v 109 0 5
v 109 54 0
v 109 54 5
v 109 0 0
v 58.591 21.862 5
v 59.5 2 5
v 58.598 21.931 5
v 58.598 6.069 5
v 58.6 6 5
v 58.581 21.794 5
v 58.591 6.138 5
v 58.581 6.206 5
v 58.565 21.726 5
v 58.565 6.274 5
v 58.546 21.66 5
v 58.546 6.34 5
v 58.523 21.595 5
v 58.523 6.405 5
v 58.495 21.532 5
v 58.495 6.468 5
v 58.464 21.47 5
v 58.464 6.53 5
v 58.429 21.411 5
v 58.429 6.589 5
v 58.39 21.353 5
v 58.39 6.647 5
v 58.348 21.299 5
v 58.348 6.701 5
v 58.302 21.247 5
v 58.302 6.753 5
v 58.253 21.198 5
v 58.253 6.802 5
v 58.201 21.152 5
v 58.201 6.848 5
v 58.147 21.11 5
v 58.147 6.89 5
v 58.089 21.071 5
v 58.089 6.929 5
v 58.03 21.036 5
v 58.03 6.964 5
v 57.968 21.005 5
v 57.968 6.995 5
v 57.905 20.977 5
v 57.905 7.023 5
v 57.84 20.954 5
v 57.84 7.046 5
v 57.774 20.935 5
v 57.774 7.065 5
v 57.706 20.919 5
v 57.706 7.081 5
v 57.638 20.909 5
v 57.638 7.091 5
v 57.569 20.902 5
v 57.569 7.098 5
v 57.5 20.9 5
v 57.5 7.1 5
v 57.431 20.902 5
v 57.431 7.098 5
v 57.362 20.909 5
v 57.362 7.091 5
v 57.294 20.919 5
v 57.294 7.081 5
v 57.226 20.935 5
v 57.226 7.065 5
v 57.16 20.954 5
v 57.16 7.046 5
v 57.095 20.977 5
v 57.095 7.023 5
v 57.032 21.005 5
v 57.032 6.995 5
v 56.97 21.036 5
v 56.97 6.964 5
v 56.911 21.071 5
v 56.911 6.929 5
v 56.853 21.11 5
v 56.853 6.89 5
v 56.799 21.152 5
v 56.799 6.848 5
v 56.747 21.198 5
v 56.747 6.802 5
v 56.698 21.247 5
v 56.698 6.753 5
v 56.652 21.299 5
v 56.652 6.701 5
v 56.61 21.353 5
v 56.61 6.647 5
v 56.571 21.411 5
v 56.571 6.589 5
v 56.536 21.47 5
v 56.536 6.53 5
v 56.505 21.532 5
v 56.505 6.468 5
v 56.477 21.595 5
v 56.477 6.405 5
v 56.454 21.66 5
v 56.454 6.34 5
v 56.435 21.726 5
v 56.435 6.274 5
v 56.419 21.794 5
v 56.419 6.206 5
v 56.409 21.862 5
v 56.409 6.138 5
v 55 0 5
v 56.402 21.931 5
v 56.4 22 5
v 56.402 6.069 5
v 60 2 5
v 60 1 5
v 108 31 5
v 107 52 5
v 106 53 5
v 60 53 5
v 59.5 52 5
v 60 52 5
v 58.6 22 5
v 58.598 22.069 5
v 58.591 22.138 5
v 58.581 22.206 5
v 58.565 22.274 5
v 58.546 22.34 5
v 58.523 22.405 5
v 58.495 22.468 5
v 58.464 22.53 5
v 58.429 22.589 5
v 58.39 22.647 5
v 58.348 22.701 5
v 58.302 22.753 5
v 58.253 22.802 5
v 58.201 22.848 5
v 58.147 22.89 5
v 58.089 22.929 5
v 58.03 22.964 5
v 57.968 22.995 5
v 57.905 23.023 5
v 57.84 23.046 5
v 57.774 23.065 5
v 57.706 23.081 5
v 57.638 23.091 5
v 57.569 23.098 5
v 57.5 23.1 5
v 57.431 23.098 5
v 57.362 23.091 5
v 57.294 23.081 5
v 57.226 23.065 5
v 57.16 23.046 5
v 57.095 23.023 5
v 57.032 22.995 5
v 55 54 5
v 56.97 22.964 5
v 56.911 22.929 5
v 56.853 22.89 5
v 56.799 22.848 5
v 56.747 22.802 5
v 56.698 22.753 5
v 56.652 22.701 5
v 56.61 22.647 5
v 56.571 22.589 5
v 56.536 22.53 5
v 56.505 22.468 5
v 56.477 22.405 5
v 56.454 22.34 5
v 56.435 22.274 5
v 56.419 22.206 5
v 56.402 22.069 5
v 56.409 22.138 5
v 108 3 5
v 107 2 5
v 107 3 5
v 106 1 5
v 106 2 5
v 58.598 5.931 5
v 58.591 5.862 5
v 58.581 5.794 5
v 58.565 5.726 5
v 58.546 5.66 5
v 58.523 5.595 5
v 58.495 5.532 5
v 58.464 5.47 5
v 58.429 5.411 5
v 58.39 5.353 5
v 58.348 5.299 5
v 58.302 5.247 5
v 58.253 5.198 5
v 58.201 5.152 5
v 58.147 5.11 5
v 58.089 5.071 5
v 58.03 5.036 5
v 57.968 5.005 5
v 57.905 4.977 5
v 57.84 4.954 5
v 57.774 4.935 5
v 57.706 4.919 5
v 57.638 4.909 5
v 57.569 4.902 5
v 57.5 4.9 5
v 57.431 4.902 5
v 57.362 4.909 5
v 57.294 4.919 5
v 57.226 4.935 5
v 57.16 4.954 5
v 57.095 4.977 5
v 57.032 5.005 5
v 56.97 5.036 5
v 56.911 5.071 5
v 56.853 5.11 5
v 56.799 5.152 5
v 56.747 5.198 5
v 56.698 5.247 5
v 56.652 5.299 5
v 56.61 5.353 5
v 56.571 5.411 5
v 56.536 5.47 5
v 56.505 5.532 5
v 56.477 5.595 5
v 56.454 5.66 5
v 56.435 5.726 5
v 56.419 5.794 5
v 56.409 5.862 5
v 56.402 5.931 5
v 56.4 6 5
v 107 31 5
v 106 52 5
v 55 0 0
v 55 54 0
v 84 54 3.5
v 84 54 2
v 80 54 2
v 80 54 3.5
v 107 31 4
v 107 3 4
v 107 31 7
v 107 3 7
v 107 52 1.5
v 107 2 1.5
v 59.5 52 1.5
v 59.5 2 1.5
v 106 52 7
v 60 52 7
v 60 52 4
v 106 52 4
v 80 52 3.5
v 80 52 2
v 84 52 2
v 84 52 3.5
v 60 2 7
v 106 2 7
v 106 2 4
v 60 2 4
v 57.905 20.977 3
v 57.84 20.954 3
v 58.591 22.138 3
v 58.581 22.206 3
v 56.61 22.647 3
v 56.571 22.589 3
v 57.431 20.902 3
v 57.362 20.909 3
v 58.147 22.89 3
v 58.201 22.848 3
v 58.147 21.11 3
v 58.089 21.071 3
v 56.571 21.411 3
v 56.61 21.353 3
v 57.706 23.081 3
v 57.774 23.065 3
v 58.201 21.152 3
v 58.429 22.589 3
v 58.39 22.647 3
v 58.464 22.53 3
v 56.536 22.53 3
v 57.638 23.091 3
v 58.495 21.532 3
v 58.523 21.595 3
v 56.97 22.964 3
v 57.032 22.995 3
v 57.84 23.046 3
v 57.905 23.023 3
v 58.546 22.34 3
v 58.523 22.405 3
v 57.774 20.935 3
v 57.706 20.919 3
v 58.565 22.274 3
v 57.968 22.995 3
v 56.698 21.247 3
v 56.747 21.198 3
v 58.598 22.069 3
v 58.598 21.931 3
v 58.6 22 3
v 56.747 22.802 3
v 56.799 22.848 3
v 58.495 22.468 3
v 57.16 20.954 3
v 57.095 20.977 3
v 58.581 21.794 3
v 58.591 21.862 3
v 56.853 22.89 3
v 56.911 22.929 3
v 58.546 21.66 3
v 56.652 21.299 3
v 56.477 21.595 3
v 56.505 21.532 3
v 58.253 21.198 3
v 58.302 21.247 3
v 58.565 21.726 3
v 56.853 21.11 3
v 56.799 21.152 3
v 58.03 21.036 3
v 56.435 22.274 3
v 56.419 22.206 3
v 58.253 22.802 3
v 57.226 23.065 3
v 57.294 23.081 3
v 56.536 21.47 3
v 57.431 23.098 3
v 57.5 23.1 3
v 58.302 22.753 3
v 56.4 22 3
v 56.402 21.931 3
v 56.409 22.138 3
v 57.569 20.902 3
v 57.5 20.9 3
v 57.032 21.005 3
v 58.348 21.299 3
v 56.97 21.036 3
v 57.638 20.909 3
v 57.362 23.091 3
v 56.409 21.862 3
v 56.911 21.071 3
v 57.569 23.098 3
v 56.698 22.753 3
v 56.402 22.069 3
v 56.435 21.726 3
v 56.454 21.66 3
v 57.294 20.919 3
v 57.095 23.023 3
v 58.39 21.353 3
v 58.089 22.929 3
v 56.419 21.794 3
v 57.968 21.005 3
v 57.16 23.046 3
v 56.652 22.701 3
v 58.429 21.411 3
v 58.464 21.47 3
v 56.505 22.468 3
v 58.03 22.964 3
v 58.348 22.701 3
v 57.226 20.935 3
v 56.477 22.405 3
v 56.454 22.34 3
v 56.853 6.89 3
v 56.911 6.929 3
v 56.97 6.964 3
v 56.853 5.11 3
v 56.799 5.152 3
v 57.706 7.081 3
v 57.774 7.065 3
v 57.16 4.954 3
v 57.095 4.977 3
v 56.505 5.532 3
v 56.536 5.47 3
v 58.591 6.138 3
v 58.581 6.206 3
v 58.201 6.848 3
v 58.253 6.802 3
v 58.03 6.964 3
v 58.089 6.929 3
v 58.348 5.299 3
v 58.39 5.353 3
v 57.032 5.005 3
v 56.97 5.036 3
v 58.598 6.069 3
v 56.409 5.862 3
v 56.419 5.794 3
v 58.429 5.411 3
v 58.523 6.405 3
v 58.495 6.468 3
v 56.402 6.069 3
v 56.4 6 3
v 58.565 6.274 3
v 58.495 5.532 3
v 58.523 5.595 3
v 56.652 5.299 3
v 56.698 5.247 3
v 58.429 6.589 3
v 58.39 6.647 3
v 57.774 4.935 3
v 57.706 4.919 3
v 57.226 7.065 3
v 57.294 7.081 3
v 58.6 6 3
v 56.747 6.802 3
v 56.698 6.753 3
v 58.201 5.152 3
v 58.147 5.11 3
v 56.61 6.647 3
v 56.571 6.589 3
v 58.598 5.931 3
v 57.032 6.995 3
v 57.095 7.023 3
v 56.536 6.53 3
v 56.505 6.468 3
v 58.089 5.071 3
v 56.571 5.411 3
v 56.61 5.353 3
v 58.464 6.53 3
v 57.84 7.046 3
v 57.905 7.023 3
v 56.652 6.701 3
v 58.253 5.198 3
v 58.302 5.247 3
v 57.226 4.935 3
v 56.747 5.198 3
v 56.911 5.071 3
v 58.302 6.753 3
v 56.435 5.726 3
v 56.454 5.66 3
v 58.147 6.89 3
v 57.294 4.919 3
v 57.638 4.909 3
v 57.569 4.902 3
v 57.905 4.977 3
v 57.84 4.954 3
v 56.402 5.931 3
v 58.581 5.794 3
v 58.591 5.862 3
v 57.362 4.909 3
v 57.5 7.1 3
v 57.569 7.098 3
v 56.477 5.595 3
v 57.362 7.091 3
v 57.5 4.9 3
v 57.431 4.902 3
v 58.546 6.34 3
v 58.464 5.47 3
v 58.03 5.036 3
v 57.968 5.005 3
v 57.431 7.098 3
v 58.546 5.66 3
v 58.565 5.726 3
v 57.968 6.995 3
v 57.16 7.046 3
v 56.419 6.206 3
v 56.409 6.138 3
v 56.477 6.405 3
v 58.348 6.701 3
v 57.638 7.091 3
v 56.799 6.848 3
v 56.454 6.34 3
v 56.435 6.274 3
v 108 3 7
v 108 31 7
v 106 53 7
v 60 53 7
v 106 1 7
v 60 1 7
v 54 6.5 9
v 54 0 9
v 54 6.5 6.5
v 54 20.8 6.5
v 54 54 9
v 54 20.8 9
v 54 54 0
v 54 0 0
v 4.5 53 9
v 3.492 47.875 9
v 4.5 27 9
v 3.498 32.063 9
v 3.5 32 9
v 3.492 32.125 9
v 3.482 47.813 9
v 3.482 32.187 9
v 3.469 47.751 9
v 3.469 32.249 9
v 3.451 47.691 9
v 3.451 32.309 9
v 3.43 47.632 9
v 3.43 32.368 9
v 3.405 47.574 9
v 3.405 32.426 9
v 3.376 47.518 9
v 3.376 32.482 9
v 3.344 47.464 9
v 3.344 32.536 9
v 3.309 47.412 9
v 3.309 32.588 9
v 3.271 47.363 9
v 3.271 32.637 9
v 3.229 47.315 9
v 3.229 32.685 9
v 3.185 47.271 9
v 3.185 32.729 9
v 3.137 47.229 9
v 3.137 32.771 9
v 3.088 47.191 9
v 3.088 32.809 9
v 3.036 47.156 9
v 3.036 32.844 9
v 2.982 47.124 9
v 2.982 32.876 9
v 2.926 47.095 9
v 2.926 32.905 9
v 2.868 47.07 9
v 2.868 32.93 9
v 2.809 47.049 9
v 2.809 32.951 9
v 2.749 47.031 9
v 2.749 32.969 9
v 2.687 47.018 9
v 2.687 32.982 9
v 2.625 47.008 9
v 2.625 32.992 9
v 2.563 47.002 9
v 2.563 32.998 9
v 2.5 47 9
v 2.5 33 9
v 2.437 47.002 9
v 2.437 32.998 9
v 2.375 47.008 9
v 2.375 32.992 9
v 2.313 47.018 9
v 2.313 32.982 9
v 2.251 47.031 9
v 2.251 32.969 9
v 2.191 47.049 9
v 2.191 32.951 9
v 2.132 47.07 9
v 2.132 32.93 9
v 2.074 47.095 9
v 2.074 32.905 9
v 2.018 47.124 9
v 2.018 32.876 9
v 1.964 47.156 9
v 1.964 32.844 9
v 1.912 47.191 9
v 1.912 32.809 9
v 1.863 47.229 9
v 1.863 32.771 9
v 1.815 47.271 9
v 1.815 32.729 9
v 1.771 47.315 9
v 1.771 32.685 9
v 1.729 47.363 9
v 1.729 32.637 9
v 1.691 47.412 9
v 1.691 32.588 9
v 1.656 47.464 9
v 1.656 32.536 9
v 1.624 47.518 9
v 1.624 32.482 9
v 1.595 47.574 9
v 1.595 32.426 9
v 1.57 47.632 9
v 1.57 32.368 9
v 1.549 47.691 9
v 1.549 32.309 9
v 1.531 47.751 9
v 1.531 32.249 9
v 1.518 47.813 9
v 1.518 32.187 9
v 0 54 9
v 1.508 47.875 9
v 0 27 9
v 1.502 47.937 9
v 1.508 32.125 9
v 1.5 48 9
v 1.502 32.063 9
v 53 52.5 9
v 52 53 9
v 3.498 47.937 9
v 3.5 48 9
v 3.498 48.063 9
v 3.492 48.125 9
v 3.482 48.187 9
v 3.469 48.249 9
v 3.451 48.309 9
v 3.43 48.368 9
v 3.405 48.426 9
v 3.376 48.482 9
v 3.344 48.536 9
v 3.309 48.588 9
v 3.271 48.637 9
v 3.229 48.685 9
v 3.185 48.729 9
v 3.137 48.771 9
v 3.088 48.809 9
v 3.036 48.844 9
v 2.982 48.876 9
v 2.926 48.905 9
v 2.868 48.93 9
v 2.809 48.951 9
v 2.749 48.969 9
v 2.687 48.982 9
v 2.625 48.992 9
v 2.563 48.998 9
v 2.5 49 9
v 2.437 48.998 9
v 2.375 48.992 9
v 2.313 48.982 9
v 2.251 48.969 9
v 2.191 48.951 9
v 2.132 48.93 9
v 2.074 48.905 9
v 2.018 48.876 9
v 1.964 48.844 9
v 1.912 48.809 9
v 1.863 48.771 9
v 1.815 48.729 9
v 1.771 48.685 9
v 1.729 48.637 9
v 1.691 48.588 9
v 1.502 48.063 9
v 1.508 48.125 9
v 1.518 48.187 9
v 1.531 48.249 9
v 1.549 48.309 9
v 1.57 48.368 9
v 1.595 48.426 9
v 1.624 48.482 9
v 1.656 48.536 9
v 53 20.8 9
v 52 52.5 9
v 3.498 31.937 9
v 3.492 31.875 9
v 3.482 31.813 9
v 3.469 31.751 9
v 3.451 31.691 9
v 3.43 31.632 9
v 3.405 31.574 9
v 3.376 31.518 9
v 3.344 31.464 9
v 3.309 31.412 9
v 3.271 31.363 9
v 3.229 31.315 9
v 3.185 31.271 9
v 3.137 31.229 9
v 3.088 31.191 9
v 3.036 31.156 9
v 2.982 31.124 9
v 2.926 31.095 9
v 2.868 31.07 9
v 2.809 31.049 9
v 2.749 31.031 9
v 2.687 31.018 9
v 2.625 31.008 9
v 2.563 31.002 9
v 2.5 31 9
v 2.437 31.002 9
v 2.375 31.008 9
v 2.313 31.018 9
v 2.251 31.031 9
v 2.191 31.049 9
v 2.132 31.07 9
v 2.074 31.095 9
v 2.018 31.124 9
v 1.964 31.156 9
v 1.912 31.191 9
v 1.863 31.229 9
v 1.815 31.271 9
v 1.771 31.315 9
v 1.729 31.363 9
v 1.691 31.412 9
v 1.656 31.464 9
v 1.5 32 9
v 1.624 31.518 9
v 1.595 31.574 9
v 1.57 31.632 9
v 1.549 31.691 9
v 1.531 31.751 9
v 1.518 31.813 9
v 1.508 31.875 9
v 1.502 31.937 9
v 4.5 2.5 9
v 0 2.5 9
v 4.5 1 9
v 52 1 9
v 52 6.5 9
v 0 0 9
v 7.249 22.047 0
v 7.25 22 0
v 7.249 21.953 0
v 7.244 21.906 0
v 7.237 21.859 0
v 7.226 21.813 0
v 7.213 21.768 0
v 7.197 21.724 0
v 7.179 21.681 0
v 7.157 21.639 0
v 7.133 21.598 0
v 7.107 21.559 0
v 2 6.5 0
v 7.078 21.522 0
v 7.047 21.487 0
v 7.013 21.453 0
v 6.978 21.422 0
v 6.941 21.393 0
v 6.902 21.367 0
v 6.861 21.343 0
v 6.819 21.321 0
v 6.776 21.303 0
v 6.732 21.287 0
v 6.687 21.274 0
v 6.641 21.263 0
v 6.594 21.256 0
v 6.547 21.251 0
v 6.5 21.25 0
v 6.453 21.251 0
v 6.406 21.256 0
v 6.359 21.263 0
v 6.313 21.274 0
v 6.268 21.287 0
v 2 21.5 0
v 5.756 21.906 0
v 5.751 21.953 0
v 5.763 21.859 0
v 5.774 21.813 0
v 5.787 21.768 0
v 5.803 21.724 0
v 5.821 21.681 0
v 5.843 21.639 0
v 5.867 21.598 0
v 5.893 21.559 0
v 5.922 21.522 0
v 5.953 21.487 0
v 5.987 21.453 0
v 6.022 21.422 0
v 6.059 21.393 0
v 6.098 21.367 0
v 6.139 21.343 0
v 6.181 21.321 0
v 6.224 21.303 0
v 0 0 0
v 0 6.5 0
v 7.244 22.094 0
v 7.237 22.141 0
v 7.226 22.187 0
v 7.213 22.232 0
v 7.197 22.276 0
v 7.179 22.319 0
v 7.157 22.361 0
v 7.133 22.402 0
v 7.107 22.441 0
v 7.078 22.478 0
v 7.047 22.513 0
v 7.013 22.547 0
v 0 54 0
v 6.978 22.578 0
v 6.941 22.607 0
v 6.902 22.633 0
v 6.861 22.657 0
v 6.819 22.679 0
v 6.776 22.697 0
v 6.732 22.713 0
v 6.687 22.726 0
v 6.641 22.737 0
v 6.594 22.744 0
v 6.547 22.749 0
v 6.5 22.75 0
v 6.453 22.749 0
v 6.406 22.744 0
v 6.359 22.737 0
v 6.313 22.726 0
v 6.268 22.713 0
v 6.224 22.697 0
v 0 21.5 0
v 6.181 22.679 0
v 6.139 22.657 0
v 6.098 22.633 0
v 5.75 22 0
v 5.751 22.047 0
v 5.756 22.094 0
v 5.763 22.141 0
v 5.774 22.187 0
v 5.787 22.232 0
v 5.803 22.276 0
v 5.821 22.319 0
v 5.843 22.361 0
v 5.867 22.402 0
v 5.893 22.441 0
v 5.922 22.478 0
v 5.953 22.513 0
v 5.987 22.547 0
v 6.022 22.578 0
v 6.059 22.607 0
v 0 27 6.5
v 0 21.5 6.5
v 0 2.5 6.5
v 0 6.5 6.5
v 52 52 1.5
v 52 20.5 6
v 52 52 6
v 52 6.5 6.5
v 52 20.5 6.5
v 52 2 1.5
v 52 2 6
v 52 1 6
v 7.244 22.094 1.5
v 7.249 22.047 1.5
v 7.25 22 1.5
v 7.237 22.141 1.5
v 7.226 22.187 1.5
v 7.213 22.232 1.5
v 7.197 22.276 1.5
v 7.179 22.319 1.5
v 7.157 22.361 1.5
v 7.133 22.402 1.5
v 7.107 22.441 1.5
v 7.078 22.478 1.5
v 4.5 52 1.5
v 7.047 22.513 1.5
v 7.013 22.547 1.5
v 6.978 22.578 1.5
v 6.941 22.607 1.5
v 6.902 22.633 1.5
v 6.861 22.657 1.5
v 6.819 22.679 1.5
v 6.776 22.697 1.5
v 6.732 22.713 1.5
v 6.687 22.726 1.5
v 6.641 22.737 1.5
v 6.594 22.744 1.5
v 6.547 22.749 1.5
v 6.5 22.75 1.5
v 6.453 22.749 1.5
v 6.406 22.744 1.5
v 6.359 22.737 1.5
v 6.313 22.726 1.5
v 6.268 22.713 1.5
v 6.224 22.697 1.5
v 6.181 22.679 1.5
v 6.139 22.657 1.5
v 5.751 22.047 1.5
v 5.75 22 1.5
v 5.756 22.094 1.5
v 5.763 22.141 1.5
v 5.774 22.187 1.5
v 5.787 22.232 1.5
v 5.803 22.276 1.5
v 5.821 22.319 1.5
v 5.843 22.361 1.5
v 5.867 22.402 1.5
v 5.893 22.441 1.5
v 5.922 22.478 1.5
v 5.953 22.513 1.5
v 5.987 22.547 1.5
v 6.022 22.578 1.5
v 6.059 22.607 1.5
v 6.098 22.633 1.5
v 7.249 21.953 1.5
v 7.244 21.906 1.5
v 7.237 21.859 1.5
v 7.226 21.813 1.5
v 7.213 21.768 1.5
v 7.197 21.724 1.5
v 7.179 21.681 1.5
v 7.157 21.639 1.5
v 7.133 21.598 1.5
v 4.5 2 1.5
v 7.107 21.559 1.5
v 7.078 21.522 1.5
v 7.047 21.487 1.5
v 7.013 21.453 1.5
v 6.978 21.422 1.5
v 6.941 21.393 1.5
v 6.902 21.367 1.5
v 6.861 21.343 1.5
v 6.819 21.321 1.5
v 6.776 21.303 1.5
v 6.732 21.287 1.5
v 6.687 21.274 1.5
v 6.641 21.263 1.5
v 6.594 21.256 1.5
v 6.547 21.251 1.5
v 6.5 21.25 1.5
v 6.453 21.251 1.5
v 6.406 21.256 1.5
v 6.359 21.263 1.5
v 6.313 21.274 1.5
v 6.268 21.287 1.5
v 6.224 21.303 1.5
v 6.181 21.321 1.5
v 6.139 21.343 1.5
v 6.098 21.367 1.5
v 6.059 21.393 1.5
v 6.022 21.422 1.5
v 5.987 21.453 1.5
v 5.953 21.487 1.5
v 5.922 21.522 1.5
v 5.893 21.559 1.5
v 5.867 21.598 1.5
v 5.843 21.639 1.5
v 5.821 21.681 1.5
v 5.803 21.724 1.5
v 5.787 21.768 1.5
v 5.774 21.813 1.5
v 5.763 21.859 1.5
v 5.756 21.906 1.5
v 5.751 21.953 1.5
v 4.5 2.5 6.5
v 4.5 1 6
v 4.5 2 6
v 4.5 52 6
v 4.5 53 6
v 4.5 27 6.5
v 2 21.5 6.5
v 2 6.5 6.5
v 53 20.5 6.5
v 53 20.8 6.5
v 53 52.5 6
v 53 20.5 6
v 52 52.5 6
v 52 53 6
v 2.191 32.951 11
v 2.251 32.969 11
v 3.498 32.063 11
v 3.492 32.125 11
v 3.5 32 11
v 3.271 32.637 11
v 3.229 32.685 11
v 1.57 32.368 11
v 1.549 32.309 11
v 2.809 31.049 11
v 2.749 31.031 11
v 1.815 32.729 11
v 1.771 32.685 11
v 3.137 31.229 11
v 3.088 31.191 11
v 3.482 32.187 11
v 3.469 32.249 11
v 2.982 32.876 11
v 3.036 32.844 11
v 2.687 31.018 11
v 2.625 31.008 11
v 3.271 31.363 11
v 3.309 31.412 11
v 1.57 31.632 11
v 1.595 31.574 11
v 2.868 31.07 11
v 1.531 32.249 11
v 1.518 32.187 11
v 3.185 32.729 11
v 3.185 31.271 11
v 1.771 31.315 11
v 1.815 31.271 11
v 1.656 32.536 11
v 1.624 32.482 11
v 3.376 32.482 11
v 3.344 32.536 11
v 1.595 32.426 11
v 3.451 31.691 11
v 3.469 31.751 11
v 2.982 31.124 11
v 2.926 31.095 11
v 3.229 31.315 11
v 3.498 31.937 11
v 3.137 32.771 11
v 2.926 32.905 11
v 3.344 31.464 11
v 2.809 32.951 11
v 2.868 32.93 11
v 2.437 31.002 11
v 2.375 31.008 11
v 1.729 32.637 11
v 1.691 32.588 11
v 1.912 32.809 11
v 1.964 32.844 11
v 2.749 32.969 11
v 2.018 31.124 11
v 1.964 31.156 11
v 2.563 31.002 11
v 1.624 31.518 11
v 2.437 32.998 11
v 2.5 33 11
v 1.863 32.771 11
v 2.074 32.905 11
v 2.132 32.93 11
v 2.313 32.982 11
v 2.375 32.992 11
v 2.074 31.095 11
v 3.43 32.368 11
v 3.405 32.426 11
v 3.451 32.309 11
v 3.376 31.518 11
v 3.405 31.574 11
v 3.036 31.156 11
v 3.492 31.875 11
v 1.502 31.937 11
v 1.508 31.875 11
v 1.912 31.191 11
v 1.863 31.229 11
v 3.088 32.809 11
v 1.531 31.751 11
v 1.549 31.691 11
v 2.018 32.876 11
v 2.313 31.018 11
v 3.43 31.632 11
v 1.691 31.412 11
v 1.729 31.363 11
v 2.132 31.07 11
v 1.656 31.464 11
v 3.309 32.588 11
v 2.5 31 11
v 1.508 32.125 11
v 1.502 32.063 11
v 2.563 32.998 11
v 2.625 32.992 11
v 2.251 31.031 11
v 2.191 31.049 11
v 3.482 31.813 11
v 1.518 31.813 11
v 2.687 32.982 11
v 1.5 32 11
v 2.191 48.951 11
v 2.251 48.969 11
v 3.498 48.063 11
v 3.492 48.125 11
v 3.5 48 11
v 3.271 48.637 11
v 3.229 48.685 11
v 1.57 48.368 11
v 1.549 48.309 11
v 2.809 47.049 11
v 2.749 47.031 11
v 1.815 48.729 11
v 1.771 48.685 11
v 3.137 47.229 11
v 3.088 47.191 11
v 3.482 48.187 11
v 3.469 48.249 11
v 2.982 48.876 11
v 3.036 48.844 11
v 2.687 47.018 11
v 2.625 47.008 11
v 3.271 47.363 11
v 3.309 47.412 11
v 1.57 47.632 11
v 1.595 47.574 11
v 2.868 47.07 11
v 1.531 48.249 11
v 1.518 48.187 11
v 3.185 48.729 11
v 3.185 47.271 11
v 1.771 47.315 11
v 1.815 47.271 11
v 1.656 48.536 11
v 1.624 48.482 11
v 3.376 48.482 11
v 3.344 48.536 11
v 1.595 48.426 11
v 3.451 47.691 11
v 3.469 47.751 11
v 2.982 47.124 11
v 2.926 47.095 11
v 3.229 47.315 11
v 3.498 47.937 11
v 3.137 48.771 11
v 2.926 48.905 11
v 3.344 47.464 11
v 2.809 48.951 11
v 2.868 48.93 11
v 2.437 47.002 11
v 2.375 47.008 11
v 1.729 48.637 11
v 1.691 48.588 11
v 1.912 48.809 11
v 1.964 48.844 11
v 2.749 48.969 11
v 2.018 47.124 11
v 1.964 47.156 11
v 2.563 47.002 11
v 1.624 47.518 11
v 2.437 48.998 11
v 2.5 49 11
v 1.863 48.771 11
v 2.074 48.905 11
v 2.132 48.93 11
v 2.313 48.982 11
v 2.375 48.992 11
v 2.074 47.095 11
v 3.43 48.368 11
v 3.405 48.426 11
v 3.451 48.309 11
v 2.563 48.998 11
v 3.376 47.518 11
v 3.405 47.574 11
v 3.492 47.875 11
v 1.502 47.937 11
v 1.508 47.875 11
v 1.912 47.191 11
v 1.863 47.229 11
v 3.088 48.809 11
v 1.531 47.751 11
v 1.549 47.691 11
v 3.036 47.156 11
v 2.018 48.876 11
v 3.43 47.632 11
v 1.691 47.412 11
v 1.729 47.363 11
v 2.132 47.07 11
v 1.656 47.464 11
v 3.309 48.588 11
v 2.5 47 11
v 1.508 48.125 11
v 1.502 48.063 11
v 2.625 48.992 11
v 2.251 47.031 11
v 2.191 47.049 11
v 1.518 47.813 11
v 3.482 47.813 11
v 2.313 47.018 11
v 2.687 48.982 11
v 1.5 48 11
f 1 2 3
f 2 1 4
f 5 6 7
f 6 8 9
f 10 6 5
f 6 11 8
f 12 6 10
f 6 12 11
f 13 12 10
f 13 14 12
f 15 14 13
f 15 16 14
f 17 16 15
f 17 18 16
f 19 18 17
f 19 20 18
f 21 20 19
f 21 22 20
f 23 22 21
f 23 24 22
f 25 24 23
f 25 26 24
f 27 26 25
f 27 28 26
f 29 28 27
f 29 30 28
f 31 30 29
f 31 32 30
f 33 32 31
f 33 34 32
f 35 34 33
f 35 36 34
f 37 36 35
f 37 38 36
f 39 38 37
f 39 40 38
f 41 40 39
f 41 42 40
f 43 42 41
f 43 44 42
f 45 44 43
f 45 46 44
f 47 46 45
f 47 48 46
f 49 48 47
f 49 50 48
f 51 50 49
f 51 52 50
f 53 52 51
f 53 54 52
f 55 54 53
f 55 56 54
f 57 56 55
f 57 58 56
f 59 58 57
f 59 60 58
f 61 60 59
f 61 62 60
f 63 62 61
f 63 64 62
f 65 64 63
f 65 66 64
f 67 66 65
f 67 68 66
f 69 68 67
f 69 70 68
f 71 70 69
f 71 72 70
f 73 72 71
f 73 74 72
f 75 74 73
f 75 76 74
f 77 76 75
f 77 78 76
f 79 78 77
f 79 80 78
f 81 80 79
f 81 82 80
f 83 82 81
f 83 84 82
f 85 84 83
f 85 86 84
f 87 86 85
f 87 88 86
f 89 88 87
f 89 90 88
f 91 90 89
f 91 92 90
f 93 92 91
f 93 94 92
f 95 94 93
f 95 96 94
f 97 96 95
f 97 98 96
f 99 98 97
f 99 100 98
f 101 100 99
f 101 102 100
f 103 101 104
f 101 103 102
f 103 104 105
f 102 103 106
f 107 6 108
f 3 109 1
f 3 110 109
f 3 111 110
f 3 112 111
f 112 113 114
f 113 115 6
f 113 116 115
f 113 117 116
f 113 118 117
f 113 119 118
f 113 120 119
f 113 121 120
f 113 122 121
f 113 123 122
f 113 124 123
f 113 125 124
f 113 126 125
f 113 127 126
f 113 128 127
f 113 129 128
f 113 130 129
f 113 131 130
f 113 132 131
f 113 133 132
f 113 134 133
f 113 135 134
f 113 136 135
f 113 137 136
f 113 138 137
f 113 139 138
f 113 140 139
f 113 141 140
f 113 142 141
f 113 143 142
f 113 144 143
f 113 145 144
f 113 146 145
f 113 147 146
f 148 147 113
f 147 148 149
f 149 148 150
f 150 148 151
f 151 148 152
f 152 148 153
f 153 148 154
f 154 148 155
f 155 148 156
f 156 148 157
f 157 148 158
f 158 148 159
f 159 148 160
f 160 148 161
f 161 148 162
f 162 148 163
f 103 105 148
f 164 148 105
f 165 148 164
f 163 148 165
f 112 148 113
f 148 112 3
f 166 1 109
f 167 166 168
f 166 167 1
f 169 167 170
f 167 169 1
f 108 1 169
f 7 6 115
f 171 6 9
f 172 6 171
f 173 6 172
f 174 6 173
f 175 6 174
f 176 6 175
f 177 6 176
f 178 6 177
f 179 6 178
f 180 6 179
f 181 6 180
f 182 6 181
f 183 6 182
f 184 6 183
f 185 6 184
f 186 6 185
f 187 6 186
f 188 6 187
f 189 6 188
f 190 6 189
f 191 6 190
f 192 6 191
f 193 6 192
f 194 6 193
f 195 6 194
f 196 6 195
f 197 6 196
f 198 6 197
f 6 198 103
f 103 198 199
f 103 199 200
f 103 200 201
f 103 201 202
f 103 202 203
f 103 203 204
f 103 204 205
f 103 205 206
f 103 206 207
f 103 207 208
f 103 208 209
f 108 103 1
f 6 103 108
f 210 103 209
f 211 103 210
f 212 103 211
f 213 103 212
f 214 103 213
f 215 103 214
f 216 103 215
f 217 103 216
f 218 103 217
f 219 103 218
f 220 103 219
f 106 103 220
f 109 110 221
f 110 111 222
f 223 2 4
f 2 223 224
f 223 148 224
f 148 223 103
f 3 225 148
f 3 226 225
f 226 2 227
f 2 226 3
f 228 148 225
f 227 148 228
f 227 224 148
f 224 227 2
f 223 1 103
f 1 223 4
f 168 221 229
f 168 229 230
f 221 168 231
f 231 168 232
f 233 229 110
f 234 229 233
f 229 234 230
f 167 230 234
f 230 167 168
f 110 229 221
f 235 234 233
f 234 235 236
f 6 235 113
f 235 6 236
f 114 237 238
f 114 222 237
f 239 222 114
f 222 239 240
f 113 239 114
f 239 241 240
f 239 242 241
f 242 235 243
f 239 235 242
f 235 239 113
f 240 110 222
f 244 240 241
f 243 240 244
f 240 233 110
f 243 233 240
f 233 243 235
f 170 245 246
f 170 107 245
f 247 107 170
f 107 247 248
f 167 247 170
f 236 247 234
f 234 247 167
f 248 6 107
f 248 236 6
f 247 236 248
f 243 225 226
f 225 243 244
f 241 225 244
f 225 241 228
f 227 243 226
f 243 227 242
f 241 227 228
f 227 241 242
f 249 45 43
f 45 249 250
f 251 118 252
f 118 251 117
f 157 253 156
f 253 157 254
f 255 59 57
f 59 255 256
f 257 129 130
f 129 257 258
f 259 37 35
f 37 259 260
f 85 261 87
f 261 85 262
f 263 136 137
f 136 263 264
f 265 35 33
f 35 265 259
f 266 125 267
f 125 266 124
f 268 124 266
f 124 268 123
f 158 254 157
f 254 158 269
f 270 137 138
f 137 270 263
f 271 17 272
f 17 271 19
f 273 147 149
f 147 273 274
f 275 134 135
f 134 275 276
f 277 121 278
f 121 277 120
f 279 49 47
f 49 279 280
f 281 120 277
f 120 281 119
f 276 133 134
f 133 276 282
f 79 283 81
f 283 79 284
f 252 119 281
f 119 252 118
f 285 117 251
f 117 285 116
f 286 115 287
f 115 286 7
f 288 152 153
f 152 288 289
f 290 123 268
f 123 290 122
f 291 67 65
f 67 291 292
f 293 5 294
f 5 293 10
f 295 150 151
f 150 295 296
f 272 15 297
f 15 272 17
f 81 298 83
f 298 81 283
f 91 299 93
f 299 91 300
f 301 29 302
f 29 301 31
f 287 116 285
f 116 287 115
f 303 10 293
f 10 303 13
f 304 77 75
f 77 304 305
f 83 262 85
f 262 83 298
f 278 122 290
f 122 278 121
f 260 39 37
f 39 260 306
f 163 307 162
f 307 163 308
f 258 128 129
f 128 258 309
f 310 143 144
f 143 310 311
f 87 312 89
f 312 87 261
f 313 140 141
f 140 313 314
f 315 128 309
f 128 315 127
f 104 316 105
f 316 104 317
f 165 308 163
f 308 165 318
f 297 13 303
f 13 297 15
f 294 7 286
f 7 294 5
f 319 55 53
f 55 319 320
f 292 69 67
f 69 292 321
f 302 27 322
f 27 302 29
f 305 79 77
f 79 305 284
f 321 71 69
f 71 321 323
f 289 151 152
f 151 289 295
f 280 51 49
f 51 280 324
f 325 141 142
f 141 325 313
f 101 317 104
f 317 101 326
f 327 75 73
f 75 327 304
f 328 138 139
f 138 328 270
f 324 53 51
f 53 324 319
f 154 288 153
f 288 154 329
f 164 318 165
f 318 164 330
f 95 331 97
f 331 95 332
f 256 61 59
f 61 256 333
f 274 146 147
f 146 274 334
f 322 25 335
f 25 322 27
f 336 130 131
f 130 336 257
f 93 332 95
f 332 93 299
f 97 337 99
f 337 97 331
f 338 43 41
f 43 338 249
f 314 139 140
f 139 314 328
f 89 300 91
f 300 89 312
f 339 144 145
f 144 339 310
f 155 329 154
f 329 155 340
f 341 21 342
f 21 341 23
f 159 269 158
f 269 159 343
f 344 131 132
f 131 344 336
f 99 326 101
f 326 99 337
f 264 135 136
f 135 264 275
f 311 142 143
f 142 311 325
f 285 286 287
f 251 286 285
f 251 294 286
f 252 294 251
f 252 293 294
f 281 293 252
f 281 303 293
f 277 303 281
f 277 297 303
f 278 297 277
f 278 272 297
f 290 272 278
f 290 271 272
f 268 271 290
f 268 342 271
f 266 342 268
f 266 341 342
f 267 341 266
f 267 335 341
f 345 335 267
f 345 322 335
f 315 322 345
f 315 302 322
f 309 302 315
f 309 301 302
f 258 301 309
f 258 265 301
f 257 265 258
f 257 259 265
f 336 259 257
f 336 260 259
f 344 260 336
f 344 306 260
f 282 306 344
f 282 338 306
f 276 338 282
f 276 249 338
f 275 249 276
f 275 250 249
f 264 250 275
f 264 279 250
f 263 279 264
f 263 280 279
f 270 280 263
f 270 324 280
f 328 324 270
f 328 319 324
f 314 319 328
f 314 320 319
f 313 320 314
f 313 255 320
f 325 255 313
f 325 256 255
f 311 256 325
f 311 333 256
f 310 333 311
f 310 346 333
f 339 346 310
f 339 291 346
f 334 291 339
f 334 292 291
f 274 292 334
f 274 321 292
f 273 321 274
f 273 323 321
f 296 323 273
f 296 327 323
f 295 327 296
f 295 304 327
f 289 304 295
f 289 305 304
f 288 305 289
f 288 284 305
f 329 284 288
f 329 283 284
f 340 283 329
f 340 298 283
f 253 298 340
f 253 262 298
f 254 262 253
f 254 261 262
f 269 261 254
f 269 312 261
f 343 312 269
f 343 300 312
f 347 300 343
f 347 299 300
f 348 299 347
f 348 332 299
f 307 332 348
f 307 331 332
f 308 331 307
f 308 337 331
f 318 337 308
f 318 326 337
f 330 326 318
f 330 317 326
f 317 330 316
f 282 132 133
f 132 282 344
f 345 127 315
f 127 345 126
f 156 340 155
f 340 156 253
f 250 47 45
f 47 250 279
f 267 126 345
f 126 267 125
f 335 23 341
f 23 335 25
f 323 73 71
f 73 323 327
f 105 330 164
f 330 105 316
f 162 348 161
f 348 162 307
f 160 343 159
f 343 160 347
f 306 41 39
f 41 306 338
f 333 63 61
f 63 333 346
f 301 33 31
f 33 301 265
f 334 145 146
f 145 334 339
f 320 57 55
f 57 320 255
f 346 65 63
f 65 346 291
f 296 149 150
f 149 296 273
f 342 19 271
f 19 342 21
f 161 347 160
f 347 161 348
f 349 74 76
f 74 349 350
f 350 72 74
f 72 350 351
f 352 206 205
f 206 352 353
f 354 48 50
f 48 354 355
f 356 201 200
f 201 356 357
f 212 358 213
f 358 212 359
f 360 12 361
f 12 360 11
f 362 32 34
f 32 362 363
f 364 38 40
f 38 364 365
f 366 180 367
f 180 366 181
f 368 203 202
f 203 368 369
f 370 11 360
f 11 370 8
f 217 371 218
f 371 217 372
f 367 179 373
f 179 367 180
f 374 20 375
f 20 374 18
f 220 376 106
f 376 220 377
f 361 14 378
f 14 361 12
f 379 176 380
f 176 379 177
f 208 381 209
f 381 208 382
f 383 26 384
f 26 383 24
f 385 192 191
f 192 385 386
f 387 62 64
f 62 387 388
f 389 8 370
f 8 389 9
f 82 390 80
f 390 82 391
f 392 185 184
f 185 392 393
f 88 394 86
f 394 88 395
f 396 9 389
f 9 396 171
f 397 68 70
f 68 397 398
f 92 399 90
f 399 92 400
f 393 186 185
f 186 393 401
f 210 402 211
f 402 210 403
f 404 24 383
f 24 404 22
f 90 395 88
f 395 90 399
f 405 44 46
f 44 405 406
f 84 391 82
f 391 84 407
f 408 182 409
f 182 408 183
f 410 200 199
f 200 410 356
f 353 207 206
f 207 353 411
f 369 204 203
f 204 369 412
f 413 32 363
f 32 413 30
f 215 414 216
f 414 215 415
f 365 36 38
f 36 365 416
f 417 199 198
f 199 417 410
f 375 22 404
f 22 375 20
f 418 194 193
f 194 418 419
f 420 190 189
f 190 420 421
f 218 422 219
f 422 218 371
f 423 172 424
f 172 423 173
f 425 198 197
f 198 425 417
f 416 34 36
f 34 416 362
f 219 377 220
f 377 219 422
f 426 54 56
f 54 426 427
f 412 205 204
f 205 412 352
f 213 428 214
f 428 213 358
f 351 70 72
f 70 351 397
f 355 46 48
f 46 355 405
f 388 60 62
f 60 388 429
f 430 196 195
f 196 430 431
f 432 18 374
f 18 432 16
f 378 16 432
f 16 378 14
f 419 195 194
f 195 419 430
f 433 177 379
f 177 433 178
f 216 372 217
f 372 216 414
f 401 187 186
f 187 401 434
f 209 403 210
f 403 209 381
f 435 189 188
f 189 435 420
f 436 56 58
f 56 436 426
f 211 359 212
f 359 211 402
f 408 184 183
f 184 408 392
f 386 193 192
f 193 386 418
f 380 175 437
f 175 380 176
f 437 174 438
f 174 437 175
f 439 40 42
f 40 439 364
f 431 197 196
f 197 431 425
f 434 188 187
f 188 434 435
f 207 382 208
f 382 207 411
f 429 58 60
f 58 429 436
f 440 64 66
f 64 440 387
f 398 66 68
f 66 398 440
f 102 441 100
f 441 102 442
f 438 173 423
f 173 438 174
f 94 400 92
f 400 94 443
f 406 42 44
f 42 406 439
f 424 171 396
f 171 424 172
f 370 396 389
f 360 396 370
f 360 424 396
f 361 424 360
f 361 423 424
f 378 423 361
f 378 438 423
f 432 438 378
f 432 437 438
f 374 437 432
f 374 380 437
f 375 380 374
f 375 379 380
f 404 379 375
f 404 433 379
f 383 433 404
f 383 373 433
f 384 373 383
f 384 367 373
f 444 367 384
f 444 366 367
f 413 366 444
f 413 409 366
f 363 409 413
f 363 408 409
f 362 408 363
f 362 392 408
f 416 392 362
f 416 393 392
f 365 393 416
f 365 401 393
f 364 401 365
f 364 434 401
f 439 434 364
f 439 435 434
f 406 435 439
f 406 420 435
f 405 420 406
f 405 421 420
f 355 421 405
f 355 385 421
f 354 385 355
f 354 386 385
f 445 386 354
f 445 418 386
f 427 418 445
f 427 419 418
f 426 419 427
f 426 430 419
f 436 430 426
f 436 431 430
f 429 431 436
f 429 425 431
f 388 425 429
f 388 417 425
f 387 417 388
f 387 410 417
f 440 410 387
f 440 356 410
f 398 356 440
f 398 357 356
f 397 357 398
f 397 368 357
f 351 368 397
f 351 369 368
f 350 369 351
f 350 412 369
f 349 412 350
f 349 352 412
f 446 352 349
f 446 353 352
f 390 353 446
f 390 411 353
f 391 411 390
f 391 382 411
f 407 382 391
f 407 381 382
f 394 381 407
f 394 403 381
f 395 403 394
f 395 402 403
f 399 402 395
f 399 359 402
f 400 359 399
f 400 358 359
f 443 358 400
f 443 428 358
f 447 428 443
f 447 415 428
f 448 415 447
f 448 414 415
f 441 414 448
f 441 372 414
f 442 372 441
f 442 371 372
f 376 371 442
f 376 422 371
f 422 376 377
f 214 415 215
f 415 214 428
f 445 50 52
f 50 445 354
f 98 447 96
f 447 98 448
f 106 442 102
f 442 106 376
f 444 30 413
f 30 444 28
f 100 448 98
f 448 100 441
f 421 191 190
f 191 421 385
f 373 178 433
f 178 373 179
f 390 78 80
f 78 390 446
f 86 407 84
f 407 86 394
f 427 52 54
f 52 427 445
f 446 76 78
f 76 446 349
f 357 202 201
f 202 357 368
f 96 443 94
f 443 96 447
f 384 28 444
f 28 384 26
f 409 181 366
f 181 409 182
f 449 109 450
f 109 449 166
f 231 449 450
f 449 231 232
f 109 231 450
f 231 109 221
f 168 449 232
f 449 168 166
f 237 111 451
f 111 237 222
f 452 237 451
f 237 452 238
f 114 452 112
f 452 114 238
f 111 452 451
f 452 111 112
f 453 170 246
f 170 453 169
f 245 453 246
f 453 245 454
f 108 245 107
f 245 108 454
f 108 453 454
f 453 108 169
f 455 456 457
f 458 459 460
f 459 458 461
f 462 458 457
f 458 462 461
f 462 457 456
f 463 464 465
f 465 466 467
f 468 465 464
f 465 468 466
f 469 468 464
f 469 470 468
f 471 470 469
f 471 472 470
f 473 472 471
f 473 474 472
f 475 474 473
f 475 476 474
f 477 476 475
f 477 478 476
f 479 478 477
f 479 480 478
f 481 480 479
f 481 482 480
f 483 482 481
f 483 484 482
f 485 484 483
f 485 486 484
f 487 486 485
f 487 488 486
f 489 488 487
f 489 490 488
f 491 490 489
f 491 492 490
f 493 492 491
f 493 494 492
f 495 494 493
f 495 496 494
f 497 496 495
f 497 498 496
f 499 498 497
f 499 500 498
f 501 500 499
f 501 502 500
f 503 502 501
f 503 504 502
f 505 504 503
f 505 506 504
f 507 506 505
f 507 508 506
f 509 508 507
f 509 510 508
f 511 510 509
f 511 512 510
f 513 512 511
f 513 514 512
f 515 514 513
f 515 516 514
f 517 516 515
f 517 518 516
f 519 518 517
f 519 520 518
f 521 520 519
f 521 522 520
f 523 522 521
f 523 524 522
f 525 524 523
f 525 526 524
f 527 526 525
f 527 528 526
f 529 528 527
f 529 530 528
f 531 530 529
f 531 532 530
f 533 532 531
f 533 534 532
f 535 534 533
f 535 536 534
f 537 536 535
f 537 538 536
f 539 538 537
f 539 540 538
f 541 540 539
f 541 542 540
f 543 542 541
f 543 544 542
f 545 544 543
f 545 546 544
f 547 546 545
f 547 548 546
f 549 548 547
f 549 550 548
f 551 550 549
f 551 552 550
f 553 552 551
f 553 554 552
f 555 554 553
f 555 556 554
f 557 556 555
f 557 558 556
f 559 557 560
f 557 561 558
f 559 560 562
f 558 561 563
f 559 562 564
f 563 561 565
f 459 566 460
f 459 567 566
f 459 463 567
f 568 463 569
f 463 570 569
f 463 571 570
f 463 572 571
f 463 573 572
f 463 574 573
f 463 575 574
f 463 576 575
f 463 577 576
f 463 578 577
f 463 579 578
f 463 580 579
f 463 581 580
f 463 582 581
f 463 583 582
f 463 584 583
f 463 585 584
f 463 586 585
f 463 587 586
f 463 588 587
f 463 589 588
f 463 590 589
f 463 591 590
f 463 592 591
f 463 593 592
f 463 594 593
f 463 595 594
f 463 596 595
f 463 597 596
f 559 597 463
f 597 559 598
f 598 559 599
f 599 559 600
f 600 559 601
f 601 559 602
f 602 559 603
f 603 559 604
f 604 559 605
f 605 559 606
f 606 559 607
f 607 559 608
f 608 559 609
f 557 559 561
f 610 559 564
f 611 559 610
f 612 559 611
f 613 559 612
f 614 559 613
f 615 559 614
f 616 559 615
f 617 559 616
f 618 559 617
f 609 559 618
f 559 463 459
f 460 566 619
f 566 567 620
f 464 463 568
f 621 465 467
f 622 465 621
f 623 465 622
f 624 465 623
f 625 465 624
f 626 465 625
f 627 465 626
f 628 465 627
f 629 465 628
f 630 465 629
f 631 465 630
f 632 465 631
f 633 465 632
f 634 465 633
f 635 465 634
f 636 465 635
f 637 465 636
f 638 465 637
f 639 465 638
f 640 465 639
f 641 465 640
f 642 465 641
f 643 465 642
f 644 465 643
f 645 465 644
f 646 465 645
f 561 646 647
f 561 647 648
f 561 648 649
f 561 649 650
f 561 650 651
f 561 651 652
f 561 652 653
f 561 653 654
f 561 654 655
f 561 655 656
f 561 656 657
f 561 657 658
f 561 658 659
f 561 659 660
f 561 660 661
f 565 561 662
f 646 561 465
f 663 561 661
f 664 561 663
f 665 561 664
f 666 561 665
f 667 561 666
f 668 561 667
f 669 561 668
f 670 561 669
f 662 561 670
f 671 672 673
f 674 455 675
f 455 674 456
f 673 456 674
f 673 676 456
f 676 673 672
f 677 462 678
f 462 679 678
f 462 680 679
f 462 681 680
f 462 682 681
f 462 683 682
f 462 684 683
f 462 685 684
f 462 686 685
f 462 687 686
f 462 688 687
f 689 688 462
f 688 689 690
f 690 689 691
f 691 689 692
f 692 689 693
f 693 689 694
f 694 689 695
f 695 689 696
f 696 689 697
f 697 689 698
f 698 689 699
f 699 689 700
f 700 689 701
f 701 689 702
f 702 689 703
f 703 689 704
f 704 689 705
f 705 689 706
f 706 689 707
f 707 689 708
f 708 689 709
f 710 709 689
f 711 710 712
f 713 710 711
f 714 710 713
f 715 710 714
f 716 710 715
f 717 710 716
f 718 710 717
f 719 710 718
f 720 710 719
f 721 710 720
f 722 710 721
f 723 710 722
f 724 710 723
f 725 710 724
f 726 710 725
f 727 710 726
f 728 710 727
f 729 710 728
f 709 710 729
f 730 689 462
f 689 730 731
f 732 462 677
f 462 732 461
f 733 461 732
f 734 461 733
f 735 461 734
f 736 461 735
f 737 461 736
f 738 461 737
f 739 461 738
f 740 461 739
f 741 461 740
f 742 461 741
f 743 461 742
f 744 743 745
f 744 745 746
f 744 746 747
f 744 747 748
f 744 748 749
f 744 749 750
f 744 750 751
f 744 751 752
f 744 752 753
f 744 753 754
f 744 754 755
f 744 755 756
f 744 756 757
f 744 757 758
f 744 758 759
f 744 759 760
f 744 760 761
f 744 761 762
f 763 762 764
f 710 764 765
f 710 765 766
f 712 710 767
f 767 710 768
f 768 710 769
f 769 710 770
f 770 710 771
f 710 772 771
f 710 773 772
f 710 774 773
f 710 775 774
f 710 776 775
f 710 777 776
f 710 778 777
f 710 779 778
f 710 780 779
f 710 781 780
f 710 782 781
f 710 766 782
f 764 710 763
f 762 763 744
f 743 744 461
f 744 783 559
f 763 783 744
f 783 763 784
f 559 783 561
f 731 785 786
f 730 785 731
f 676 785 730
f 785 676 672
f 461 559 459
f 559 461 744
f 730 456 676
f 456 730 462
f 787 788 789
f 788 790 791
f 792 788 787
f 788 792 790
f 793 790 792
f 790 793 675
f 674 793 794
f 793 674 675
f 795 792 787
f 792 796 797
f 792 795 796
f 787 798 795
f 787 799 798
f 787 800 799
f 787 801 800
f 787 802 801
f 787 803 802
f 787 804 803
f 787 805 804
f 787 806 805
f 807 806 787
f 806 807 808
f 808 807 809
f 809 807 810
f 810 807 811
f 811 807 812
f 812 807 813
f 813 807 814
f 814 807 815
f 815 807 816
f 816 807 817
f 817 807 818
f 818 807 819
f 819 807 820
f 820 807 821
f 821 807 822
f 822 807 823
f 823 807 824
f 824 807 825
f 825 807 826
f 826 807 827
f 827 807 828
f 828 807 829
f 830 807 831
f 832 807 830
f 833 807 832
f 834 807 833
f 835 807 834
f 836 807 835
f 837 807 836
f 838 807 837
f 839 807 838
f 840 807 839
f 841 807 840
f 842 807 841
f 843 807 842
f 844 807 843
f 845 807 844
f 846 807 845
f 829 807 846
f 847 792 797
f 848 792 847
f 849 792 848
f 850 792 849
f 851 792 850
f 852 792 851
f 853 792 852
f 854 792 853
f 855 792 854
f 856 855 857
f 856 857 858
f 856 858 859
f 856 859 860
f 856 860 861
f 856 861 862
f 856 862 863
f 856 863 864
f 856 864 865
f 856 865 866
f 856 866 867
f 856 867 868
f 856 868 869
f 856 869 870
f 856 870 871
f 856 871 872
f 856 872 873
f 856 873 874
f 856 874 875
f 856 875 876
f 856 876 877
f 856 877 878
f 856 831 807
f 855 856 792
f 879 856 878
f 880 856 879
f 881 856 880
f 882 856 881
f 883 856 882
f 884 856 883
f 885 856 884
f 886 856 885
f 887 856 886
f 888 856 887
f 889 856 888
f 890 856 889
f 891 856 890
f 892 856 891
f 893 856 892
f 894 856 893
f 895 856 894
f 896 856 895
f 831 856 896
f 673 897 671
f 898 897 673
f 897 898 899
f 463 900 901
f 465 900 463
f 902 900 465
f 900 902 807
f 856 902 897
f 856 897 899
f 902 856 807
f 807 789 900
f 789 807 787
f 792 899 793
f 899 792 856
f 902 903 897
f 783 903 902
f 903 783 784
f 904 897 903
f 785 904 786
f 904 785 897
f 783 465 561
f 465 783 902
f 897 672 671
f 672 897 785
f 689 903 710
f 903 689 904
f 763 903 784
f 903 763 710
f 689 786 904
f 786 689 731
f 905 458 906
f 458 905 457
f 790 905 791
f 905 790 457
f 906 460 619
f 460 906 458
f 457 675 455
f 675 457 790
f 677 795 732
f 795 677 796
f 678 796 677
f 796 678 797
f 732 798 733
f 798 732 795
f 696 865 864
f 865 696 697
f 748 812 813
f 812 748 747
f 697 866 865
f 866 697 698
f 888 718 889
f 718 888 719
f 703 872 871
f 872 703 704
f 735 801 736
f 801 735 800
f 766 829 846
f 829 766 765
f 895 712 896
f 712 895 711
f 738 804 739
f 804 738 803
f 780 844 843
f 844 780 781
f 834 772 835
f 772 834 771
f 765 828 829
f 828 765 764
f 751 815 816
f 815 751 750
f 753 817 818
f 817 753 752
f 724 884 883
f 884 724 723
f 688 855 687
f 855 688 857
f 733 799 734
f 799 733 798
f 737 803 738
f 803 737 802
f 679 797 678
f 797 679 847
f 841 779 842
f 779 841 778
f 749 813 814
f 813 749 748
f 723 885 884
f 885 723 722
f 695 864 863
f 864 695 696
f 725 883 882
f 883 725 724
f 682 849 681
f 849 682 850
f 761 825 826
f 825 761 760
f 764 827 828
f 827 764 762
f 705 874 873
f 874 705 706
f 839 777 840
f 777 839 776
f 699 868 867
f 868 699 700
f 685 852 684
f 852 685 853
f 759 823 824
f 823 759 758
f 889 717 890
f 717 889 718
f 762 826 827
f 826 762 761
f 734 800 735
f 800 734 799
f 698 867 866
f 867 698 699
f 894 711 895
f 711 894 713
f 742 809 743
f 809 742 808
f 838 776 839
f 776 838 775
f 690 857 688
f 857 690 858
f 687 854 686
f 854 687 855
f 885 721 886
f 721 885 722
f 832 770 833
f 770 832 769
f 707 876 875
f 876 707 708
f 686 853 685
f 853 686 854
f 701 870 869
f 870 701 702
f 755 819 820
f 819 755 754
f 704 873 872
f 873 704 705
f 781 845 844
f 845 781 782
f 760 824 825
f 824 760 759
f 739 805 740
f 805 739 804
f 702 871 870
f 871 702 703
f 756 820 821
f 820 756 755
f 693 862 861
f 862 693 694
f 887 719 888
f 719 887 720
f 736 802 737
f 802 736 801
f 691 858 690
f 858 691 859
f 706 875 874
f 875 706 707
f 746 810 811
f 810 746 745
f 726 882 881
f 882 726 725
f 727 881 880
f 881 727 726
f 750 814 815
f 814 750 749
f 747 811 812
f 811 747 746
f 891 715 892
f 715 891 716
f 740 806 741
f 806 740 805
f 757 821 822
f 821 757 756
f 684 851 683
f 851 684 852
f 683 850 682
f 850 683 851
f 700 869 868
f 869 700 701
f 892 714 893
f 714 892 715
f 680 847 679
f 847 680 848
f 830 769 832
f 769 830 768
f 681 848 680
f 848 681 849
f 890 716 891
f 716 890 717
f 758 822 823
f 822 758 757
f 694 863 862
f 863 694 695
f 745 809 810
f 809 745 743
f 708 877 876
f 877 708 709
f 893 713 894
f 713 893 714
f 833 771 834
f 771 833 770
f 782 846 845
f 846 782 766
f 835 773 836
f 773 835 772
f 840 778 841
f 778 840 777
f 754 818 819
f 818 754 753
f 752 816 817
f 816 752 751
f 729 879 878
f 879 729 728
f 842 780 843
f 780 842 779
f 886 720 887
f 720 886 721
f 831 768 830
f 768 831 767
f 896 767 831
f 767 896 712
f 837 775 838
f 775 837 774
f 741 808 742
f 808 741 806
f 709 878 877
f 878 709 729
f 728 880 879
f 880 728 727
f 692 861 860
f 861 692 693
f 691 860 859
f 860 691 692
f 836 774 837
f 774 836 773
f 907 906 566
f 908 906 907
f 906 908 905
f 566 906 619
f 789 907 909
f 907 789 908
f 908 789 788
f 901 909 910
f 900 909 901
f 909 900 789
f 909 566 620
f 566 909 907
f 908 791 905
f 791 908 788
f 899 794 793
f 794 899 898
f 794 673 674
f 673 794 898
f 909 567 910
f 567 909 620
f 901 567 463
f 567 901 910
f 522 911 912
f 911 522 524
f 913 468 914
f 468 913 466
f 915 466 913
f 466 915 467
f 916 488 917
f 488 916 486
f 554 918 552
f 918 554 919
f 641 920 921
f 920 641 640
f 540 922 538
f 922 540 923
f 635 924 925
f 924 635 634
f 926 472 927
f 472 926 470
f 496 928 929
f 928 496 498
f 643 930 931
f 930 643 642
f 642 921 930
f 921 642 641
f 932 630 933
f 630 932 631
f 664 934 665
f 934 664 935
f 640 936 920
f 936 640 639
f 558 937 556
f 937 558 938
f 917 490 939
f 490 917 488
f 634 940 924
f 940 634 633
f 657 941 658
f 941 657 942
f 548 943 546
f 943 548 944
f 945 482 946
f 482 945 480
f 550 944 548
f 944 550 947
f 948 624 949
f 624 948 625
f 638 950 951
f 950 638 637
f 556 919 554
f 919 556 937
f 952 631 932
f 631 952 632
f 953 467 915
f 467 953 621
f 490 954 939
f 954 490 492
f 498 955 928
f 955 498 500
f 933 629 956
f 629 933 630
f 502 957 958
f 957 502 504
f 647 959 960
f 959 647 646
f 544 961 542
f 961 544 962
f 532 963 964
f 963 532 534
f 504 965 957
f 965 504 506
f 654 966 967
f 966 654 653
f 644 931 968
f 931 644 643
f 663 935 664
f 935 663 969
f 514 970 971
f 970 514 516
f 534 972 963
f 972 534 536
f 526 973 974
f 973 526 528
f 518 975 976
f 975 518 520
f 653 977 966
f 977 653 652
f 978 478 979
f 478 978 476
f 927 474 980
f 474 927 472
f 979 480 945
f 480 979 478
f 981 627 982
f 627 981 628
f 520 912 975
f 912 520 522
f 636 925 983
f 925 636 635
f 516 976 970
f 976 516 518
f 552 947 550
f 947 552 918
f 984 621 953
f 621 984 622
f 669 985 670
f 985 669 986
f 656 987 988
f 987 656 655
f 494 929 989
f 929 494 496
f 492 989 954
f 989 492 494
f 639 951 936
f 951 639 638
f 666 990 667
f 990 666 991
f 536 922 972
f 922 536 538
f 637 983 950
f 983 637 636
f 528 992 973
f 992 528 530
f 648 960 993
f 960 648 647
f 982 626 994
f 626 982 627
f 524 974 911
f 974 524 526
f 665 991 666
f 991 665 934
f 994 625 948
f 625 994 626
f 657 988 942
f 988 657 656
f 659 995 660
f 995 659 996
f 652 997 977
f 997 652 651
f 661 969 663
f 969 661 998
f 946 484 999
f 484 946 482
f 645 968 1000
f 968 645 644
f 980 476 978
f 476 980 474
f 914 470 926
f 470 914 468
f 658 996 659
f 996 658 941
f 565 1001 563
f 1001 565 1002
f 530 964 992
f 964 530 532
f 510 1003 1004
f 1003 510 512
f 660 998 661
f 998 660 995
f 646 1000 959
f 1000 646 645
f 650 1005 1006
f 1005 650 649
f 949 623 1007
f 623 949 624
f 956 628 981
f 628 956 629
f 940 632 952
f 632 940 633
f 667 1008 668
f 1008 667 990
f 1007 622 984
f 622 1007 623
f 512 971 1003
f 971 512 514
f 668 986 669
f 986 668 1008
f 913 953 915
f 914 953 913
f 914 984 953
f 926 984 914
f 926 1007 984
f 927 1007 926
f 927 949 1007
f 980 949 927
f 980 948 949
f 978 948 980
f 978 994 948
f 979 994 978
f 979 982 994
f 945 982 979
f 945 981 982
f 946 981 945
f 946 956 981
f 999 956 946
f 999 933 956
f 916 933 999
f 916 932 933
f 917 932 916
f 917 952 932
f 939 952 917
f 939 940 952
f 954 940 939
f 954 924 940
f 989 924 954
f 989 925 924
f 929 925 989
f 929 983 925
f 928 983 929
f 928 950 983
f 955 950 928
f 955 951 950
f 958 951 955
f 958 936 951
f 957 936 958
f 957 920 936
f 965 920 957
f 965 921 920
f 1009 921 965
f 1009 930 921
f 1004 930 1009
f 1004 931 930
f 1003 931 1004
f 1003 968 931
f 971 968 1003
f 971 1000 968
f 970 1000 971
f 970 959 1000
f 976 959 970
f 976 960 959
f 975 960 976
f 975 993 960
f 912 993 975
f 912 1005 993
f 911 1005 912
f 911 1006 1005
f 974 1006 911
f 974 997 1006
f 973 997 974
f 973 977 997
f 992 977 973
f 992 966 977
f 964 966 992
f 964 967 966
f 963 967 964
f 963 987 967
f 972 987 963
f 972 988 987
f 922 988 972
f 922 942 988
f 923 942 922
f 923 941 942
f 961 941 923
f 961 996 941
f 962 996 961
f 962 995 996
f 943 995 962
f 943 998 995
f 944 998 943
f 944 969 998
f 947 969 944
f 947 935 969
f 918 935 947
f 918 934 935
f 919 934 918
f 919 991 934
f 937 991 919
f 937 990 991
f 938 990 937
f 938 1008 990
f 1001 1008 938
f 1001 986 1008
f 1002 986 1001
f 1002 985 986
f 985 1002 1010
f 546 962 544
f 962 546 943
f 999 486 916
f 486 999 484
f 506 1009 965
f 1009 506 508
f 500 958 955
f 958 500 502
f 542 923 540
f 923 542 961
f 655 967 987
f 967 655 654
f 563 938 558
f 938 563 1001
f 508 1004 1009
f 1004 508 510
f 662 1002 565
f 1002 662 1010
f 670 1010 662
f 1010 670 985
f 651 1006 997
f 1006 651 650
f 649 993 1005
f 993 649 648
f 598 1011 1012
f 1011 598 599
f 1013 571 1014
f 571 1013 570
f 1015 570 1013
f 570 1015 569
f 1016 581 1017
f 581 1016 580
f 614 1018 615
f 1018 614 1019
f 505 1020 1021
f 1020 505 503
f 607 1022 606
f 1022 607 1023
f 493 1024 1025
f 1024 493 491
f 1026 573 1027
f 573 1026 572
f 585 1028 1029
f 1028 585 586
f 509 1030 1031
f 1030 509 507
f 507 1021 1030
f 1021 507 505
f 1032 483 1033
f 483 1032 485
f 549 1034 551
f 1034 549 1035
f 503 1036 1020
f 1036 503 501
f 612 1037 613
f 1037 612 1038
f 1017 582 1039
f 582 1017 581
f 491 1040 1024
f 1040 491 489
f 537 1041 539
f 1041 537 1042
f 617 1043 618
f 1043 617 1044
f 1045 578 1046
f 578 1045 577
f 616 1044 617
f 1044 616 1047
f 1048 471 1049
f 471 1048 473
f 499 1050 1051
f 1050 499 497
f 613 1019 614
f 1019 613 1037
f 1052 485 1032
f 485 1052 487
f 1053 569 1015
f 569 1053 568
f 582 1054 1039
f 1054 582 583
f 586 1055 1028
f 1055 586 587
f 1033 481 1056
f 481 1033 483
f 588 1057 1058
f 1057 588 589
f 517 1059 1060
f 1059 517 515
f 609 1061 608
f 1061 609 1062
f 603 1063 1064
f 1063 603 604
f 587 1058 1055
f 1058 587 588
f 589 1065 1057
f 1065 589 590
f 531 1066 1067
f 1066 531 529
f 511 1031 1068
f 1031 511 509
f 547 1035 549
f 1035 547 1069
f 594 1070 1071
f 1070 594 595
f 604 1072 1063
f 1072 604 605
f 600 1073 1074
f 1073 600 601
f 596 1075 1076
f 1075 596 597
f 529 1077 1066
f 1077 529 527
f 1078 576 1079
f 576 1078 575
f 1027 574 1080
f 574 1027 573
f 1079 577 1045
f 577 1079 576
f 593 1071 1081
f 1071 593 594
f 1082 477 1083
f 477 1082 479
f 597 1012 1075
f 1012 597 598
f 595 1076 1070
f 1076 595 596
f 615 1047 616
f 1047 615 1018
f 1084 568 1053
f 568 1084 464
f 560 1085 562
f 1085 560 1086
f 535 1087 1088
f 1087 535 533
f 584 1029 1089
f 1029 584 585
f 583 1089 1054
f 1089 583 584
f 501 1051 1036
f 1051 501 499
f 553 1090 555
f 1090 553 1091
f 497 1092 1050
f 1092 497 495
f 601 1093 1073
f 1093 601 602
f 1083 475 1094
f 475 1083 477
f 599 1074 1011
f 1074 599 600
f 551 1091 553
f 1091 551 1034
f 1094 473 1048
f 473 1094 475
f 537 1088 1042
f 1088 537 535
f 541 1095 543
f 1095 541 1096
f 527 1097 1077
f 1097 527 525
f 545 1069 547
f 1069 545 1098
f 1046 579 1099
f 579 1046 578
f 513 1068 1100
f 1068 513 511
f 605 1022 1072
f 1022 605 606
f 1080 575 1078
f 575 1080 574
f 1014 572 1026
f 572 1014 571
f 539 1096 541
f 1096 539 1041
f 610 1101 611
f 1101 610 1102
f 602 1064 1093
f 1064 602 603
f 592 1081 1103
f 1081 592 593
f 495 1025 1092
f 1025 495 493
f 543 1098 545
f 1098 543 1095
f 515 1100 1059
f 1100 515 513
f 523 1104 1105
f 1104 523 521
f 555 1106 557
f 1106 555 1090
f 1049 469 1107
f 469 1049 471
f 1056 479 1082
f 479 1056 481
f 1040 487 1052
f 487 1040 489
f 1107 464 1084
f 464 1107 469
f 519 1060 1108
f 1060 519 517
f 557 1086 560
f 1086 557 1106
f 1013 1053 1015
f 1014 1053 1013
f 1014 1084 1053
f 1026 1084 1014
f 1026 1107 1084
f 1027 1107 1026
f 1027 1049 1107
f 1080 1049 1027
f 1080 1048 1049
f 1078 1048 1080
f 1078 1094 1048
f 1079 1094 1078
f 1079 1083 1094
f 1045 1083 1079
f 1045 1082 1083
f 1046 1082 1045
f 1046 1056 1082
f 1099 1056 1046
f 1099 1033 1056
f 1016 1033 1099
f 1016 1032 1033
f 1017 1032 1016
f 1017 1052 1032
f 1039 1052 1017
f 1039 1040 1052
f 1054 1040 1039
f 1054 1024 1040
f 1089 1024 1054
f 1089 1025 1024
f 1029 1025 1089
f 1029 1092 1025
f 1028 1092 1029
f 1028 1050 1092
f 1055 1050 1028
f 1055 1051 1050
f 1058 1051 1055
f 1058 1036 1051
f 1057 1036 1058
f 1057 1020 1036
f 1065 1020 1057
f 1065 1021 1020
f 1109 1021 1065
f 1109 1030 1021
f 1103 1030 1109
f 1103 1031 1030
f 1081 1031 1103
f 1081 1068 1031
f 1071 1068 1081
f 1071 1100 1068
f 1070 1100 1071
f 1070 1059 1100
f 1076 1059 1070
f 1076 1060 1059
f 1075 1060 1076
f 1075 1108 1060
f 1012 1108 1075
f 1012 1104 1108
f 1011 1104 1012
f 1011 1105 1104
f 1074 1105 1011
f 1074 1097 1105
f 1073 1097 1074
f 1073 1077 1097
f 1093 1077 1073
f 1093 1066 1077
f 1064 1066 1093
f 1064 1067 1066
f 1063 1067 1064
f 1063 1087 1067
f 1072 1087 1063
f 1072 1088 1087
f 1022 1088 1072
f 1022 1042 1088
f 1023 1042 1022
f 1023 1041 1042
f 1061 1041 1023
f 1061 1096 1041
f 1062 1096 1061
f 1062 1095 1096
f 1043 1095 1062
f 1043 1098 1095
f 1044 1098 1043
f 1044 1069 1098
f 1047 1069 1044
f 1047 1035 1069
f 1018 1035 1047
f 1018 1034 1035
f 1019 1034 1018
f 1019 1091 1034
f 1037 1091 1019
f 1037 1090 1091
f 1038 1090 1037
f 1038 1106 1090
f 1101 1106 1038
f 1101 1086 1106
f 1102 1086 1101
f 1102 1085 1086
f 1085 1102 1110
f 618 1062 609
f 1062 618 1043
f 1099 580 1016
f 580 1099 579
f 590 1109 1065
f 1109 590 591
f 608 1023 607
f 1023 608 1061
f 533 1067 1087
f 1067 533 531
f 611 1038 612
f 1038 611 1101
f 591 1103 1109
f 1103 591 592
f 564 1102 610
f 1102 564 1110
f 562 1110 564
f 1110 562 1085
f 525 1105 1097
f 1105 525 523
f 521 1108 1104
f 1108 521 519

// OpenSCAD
 translate([55,0,0]) union() {
     difference() {
        cube([54,54,5]);
        translate([4.5,2,1.5]) cube([47.5,50,10]);
        translate([25,50,2]) cube([4,10,1.5]);
        translate([2.5,54-32,3]) cylinder(r=1.1, h=10, $fn=100);
        translate([2.5,54-48,3]) cylinder(r=1.1, h=10, $fn=100);
     }
     translate([52,3,4]) cube([1,28,3]);   
     translate([5,52,4]) cube([46,1,3]);   
     translate([5,1,4]) cube([46,1,3]);   
} 

difference() {
  cube([54,54,9]);
  translate([4.5,2,1.5]) cube([47.5,50,10]);
  translate([-1,2.5,6.5]) cube([10,24.5,10]);  
  translate([-1,6.5,-1]) cube([3,15,11]);  
  translate([50,6.5,6.5]) cube([10,14.3,5]);  
  translate([6.5,22,-1]) cylinder(h=10, r=0.75, $fn=100);  

  translate([50,20.5,6]) cube([3,32,13]);
  translate([4.5,1,6]) cube([47.5,3,13]);
  translate([4.5,50,6]) cube([47.5,3,13]);
}  

translate([2.5,32,1]) cylinder(h=10, r=1, $fn=100);
translate([2.5,48,1]) cylinder(h=10, r=1, $fn=100);
